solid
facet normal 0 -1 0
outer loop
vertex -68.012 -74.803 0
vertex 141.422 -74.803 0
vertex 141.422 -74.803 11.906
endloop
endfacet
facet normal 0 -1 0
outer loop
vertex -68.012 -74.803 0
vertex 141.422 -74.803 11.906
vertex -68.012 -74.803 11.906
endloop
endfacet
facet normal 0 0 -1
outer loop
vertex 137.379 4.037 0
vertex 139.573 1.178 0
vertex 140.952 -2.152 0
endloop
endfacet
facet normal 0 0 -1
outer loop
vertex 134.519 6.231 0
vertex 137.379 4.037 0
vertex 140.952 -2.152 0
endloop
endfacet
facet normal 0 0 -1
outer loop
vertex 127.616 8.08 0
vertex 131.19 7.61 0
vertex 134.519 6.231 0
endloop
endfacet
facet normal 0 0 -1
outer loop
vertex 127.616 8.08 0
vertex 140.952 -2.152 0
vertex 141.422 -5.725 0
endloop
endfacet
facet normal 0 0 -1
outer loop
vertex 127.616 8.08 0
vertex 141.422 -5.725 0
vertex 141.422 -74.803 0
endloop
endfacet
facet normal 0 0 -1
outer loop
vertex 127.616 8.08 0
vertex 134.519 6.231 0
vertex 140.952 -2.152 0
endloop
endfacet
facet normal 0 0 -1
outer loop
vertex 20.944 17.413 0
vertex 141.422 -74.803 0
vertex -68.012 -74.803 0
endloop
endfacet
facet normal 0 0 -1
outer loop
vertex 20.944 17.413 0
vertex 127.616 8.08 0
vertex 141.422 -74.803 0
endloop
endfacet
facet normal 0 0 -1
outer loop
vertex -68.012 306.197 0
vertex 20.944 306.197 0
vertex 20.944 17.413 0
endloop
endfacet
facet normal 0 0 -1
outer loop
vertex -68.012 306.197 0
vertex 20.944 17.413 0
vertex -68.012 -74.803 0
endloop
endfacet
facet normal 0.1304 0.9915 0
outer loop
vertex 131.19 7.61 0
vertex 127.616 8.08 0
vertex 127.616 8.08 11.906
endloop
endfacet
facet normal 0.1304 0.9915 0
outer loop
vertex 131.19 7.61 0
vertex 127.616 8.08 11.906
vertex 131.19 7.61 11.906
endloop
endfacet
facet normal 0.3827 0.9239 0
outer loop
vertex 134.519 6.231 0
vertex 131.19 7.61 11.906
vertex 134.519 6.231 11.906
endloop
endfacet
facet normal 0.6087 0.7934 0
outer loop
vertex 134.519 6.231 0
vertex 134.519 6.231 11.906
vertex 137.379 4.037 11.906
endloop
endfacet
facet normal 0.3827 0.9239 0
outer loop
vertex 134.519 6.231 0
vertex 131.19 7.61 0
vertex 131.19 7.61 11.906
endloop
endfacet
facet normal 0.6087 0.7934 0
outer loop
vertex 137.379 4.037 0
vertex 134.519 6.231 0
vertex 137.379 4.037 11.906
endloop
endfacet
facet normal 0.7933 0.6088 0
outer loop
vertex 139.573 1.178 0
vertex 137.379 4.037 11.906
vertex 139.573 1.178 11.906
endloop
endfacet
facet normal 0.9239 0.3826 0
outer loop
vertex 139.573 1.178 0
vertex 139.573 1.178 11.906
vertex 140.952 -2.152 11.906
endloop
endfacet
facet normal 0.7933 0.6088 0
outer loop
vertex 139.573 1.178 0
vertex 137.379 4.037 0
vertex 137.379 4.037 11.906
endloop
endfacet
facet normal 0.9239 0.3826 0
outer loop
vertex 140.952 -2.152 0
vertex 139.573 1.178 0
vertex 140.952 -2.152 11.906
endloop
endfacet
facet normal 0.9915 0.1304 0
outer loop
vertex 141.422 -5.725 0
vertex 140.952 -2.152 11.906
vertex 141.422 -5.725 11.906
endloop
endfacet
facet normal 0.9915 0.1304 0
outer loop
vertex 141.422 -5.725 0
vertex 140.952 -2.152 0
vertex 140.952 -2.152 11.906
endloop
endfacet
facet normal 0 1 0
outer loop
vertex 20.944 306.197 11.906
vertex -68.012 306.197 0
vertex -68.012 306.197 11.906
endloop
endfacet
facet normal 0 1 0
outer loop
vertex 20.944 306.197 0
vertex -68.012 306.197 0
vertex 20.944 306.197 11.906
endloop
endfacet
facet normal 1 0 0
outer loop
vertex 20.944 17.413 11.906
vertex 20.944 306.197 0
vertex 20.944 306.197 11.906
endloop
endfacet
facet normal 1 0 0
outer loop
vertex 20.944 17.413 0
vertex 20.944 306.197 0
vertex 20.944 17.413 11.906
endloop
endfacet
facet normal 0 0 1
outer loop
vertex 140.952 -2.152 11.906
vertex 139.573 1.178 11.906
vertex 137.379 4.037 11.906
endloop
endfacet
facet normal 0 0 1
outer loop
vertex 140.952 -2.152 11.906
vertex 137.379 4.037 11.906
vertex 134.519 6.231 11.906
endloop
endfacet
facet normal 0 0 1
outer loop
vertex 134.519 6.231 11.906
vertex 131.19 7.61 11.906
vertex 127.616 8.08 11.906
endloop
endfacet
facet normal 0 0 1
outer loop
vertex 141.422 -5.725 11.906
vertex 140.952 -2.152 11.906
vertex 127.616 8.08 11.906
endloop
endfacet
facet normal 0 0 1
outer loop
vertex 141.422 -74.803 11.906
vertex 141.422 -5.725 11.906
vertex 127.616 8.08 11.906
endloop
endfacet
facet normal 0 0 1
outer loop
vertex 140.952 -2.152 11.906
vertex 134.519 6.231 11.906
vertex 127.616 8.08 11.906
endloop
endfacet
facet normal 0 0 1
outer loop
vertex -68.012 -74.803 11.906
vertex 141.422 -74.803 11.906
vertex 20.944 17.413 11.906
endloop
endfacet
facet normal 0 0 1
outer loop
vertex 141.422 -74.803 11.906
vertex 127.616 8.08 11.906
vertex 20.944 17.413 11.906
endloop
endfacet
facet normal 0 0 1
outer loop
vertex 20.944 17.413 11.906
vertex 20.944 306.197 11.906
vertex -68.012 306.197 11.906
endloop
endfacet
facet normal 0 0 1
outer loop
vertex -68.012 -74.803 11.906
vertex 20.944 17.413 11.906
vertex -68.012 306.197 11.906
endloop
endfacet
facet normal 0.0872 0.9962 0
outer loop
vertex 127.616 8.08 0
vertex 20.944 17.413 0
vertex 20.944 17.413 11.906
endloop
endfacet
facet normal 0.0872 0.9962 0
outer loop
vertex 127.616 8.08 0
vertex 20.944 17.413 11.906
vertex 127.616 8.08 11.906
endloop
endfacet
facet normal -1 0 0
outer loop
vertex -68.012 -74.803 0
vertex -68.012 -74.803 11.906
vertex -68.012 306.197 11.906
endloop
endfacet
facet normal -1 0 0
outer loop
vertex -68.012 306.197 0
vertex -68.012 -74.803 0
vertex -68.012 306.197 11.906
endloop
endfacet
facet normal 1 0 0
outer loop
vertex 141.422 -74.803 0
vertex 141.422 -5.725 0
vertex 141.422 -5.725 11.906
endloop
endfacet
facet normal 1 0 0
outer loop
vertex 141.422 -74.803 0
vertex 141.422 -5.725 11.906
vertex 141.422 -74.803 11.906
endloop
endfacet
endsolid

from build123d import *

# Parameters (mm, degrees)
BOSS_EXTRUDE1_DEPTH = 11.90625
SKETCH2_W           = 33.274
SKETCH2_H           = 381
CUT_EXTRUDE1_DEPTH  = 12.90625


with BuildPart() as part:
    # Sketch1 → Boss-Extrude1 (new body)
    with BuildSketch(Plane.XY):
        with BuildLine():
            Line((-101.285966724, 306.196742645), (0.115853822, 306.196742645))
            Line((0.115853822, 306.196742645), (20.943853822, 306.196742645))
            Line((20.943853822, 306.196742645), (20.943853822, 111.886742645))
            Line((20.943853822, 111.886742645), (20.943853822, 34.495334159))
            Line((20.943853822, 34.495334159), (20.943853822, 17.413022699))
            Line((20.943853822, 17.413022699), (127.616425214, 8.080381993))
            ThreePointArc((127.616425214, 8.080381993), (137.378567656, 4.036770195), (141.422179454, -5.725372247))
            Line((141.422179454, -5.725372247), (141.422179454, -74.803257355))
            Line((141.422179454, -74.803257355), (133.664033276, -74.803257355))
            Line((133.664033276, -74.803257355), (-101.285966724, -74.803257355))
            Line((-101.285966724, -74.803257355), (-101.285966724, 306.196742645))
        make_face()
    extrude(amount=BOSS_EXTRUDE1_DEPTH)

    # Sketch2 → Cut-Extrude1 (cut, through all)
    with BuildSketch(Plane.XY.offset(11.90625)):
        with Locations((-84.648966724, 115.696742645)):
            Rectangle(SKETCH2_W, SKETCH2_H)
    extrude(amount=-CUT_EXTRUDE1_DEPTH, mode=Mode.SUBTRACT)


solid = part.part
